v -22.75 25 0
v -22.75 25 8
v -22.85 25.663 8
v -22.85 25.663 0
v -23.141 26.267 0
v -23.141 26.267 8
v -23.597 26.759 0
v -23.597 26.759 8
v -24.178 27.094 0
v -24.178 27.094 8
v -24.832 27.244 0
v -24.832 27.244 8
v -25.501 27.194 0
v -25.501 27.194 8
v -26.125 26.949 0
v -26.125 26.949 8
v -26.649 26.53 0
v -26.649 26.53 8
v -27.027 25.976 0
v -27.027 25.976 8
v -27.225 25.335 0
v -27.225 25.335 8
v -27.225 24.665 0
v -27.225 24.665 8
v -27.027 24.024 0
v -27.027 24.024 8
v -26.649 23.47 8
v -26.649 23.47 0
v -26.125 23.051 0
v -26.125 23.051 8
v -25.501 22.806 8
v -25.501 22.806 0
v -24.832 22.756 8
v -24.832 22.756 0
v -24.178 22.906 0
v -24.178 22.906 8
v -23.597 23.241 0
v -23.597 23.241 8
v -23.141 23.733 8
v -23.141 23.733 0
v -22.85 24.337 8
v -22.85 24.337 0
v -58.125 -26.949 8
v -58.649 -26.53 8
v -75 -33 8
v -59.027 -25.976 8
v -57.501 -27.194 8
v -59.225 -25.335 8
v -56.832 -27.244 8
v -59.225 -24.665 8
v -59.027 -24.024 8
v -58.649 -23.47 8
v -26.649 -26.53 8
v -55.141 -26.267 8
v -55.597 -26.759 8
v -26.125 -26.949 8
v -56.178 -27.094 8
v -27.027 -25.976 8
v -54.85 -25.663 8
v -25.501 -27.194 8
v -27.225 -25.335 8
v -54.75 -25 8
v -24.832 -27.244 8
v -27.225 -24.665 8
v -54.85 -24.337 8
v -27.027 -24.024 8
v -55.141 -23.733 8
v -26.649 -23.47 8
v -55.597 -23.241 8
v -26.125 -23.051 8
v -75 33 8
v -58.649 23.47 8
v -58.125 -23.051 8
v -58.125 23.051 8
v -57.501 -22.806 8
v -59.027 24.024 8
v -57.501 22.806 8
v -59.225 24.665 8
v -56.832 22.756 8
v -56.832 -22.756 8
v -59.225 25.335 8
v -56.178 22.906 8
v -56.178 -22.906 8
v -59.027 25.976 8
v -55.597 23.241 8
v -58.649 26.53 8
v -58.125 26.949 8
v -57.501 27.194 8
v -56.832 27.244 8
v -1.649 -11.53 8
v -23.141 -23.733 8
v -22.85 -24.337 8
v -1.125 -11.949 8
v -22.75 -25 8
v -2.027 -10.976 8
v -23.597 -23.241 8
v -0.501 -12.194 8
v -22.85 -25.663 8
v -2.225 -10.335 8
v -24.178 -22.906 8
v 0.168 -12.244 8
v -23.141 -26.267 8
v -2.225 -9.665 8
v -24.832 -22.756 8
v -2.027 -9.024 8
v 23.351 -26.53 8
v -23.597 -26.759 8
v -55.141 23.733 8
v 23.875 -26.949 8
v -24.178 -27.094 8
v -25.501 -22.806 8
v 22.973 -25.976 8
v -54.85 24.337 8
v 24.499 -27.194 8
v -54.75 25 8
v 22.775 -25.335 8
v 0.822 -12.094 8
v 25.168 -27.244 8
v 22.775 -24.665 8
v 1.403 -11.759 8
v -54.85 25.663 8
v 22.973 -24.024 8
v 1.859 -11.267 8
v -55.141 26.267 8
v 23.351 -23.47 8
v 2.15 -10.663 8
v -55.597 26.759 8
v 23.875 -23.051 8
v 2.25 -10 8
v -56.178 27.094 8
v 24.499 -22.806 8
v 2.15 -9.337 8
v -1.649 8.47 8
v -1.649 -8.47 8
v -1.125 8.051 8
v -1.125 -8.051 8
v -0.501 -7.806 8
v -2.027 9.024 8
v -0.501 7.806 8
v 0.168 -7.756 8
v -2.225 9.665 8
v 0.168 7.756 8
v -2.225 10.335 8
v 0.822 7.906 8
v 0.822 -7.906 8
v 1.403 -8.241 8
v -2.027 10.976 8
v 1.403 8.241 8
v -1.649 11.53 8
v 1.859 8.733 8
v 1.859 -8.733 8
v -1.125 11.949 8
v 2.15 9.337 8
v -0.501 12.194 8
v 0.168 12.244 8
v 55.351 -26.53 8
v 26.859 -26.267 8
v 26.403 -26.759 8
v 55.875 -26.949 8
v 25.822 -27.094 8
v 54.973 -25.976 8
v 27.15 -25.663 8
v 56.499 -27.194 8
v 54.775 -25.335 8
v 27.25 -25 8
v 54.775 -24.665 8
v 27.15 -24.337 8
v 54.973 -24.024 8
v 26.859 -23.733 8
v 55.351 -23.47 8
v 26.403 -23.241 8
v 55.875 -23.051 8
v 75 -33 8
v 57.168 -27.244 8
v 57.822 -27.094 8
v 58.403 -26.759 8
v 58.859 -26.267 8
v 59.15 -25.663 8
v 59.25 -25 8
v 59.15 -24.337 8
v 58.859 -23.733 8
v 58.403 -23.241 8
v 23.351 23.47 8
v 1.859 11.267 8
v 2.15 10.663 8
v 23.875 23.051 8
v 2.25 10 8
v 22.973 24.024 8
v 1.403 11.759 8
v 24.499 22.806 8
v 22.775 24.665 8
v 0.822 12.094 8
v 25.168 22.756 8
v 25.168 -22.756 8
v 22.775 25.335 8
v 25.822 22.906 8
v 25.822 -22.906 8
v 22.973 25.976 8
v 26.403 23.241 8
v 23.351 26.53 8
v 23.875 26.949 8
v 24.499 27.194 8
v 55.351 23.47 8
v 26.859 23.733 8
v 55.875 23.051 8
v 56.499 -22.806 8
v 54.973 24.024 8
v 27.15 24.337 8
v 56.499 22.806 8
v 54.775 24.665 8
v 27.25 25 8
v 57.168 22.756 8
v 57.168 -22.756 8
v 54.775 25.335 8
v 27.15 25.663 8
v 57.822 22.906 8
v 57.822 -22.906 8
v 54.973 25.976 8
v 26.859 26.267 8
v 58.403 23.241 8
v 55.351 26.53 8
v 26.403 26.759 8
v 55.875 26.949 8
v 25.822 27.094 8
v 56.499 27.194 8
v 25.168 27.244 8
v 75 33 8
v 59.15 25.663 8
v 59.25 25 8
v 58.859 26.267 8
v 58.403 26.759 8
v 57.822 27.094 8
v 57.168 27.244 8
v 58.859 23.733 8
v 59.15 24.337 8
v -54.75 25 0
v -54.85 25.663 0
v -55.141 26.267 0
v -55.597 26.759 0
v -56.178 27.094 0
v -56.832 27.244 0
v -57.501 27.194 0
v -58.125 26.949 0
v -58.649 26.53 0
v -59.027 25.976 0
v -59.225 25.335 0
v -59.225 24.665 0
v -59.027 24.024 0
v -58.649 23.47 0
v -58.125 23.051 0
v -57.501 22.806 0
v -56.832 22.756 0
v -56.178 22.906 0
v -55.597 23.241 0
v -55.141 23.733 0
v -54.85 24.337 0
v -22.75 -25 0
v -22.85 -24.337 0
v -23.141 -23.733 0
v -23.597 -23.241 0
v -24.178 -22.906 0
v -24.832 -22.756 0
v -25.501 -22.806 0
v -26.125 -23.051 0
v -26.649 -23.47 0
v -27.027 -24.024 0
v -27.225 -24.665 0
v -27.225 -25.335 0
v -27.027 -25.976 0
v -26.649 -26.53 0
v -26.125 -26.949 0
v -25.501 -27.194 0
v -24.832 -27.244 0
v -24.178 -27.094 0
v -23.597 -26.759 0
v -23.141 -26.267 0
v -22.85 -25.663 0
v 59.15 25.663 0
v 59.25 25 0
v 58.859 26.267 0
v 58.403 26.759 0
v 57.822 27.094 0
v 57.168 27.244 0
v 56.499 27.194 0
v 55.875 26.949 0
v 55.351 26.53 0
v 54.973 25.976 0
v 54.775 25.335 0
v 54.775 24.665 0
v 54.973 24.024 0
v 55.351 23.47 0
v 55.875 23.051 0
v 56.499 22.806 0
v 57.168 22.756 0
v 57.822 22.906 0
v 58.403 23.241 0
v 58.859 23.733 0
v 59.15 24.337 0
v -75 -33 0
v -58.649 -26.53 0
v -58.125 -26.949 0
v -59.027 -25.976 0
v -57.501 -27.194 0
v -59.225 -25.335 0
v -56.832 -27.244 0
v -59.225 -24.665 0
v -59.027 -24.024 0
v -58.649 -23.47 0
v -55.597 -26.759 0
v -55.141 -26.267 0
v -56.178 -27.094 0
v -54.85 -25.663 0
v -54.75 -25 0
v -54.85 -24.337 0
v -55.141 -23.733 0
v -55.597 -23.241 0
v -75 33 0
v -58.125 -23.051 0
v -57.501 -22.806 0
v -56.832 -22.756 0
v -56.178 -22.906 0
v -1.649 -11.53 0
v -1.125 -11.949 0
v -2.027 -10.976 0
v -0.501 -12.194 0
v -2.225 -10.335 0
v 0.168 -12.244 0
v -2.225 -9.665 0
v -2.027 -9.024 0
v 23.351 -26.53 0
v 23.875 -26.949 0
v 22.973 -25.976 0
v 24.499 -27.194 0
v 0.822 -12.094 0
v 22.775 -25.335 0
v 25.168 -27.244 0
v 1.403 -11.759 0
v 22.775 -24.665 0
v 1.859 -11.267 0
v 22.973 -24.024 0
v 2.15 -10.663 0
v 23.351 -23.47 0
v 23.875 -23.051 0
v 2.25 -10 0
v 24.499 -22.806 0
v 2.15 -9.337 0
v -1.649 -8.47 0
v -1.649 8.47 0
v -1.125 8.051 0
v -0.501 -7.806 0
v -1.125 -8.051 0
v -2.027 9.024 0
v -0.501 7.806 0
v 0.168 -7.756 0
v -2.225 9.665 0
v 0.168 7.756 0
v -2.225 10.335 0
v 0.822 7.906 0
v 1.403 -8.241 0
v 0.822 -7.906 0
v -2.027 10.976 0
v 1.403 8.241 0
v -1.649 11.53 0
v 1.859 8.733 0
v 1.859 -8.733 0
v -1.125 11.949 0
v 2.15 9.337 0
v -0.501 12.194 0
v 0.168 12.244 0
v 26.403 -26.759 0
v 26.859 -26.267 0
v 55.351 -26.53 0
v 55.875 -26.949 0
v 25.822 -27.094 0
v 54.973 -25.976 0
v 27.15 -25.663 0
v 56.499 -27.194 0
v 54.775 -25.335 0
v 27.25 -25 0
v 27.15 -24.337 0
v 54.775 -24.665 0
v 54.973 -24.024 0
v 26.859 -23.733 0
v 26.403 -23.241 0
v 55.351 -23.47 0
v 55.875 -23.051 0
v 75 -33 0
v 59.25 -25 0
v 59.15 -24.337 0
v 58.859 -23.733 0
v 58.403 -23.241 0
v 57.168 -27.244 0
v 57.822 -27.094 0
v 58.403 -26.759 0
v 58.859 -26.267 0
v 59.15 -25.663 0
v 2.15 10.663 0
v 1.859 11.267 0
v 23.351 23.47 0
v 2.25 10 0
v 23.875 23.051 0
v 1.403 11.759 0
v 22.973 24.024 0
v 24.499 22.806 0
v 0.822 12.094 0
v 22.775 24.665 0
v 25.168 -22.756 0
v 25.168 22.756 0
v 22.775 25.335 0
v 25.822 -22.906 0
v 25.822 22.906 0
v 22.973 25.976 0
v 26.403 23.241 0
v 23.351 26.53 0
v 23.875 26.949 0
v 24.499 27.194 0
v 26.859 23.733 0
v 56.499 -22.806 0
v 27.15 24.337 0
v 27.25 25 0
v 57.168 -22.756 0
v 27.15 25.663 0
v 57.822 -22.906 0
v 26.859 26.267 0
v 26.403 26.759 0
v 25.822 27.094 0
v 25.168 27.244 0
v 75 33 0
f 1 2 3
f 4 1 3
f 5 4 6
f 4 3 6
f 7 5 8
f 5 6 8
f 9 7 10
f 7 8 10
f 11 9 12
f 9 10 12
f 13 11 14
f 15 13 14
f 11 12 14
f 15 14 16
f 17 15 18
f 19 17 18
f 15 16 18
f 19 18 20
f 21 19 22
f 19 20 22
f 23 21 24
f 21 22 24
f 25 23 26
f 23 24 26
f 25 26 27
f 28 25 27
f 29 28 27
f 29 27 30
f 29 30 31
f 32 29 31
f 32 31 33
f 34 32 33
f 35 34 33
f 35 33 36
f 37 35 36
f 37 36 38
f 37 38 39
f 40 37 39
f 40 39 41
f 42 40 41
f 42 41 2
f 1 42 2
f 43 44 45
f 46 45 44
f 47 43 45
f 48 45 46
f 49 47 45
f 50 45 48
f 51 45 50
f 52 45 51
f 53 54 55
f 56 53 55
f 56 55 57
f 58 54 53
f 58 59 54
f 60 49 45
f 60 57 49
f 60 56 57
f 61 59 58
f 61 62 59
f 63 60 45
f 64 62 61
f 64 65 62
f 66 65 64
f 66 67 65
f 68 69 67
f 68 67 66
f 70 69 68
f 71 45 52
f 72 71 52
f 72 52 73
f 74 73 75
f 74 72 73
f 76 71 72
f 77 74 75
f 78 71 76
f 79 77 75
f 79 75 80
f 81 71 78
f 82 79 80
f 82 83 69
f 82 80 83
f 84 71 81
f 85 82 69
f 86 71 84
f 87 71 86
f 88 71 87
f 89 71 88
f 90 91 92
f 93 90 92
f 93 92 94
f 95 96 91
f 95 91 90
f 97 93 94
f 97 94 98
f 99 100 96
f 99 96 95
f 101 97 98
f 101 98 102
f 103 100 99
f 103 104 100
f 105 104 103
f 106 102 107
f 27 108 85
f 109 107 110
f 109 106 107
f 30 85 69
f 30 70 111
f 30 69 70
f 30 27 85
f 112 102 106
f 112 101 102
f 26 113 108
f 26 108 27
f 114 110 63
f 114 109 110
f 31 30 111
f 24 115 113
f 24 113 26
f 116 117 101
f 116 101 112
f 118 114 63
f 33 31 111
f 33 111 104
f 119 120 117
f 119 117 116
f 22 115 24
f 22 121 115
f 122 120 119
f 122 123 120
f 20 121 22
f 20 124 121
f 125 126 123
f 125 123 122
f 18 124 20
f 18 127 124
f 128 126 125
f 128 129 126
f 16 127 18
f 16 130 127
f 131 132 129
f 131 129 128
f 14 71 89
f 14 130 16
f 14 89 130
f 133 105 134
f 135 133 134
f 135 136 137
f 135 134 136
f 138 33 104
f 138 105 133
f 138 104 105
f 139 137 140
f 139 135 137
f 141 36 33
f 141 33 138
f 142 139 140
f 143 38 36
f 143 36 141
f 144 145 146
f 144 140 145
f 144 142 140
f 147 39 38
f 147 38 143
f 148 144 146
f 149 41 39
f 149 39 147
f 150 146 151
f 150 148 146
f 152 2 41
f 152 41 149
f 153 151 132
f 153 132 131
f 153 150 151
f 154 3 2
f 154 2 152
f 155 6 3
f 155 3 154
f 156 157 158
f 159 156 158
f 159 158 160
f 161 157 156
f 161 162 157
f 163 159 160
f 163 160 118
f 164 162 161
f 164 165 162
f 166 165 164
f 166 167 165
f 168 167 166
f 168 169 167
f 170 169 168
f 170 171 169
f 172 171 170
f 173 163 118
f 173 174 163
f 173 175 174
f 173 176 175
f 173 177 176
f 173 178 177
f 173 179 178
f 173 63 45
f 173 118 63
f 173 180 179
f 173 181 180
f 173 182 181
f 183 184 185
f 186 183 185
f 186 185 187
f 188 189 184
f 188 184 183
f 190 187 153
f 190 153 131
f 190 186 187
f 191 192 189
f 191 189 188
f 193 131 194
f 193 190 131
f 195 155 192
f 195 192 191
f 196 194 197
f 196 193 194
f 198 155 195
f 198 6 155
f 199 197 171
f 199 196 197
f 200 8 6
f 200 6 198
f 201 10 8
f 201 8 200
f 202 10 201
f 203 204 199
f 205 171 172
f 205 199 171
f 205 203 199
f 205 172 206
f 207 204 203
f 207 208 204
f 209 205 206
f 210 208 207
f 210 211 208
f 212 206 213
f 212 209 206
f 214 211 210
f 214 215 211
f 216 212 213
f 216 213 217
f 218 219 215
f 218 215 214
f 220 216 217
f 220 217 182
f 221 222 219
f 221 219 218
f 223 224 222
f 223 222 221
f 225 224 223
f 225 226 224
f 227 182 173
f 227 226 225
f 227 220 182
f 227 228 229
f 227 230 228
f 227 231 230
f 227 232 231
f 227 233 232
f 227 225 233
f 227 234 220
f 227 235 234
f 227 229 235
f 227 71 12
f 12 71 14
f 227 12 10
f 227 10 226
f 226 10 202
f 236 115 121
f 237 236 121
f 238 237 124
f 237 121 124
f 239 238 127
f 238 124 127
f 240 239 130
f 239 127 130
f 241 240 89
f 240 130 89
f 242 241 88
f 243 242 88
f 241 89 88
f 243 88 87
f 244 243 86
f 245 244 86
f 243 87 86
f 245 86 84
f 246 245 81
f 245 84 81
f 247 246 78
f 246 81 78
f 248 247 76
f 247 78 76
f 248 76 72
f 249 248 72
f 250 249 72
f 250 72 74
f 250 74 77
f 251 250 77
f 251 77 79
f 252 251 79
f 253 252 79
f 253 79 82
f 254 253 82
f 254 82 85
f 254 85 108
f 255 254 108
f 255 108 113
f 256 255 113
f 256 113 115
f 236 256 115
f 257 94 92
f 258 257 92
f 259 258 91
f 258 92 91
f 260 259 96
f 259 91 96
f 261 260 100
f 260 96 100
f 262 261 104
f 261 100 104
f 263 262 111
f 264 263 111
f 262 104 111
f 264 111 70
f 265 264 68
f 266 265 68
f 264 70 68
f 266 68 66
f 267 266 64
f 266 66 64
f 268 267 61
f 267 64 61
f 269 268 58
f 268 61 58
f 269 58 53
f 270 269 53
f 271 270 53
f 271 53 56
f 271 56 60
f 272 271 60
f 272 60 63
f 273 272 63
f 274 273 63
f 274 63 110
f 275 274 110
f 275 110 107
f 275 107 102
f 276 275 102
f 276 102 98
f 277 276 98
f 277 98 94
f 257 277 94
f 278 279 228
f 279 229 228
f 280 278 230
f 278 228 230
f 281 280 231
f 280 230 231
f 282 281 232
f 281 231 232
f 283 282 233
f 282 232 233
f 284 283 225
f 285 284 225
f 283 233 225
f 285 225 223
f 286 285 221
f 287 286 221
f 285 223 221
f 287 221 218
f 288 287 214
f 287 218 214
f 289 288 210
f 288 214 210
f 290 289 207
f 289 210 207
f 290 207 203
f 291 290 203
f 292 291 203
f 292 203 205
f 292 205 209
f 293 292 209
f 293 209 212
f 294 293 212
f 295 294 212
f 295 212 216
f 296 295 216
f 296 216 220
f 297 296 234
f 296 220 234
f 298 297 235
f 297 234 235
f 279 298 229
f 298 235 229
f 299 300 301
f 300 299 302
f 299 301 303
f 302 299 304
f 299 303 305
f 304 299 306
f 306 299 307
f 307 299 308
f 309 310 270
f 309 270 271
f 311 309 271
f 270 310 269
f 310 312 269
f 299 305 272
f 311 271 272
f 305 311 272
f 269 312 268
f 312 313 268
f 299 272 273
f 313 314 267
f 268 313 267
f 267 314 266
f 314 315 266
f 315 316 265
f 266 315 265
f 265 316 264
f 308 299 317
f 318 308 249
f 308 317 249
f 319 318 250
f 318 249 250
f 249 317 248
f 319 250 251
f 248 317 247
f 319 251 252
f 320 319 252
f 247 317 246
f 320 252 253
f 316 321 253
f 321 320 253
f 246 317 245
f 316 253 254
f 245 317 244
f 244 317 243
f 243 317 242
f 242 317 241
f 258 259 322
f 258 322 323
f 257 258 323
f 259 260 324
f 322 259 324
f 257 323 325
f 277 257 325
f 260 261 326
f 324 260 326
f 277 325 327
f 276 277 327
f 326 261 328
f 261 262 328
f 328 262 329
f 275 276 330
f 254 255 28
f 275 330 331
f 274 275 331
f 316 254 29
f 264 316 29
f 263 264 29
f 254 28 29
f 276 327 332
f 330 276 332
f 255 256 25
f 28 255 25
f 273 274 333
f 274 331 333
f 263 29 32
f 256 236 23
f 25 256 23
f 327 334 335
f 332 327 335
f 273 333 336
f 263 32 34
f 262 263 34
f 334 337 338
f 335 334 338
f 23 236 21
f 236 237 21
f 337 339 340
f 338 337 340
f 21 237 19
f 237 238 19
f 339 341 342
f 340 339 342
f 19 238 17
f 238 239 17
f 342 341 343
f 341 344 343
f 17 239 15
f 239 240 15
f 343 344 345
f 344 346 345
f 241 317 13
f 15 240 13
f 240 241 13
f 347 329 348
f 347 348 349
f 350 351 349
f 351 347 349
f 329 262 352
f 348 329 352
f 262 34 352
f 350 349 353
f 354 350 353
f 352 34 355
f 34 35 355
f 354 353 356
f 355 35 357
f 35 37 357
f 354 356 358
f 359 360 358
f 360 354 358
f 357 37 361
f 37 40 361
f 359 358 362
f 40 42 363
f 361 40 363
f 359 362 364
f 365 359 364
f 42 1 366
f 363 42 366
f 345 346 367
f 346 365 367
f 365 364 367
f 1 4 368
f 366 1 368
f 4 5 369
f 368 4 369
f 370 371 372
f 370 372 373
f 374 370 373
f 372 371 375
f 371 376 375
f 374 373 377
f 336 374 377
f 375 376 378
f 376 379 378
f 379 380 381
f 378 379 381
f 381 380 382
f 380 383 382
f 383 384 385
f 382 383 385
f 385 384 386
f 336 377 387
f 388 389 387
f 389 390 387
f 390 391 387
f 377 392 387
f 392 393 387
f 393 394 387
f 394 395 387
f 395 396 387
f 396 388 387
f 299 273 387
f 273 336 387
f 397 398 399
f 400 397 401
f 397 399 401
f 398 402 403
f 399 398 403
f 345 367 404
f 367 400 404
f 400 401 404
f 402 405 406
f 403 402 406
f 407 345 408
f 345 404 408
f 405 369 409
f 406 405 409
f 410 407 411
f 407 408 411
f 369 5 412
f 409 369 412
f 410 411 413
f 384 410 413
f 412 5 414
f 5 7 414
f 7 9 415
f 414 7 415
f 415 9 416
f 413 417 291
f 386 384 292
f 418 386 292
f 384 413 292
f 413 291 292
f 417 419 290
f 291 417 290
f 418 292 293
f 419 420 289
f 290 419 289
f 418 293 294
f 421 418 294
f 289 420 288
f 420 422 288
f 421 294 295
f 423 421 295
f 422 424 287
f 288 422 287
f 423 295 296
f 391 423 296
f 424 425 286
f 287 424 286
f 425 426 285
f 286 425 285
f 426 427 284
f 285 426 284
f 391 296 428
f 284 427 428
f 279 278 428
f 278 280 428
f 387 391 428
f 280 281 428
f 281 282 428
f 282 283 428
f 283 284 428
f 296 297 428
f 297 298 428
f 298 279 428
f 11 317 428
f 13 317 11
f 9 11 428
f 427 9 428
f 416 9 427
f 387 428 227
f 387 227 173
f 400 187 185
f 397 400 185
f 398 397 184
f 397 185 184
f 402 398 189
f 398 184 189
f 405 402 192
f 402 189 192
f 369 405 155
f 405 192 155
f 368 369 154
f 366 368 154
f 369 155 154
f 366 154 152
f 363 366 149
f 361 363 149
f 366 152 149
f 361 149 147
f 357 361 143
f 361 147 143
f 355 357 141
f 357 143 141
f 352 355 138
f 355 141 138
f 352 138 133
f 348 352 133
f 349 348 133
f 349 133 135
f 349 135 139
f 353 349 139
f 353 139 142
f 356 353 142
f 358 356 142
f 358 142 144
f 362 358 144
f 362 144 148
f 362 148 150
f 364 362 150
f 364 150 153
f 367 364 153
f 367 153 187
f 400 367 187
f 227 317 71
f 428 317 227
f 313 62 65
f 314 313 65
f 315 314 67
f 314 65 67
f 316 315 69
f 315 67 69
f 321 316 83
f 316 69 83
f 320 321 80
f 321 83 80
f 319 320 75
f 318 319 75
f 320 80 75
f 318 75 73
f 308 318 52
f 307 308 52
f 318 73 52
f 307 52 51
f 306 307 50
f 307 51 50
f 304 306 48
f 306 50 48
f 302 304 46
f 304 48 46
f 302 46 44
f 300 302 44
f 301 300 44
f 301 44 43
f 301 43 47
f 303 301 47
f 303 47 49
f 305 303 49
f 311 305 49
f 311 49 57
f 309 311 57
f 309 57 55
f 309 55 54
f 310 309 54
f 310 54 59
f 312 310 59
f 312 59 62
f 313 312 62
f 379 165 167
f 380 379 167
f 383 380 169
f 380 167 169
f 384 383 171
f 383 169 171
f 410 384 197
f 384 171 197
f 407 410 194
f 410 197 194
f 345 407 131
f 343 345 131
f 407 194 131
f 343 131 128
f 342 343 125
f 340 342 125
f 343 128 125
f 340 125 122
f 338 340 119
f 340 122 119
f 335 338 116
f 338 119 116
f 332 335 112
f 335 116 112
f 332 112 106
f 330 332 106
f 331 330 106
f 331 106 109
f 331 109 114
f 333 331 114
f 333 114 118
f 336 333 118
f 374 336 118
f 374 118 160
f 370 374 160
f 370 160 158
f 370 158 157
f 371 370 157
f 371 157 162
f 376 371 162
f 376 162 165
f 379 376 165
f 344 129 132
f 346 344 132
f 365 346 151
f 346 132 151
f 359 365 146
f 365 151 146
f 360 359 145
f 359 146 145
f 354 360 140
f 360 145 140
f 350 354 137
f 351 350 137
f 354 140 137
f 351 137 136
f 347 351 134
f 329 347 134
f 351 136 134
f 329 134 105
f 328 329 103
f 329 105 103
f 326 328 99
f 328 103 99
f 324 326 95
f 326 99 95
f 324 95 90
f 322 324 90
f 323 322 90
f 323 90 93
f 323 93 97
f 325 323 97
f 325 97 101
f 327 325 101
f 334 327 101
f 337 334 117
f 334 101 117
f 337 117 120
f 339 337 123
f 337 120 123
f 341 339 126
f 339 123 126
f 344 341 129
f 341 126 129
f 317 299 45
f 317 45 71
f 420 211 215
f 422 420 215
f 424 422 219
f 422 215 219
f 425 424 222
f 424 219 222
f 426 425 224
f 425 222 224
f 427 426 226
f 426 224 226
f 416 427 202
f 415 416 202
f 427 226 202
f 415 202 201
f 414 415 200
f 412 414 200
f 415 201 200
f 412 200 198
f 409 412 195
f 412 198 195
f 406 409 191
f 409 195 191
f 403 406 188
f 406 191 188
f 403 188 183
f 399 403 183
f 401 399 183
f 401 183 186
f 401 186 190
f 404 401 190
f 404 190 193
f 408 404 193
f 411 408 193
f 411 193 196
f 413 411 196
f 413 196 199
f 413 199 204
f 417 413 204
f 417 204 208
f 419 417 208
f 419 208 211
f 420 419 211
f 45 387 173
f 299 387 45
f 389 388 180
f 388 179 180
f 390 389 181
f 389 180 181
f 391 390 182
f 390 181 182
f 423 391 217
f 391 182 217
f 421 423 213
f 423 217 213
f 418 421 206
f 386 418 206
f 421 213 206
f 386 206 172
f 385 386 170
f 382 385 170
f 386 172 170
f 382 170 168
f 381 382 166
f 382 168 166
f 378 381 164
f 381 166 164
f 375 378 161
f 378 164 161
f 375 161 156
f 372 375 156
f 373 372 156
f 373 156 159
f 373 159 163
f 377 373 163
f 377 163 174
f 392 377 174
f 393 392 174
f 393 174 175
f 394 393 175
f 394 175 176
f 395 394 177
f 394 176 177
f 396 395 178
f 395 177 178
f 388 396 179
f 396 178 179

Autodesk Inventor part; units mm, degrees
ref_plane "YZ Plane" through (0, 0, 0) normal (1, 0, 0) x (0, 1, 0)
ref_plane "XZ Plane" through (0, 0, 0) normal (0, 1, 0) x (-1, 0, 0)
ref_plane "XY Plane" through (0, 0, 0) normal (0, 0, 1) x (1, 0, 0)
sketch "Sketch1" plane through (0, 0, 0) normal (0, 0, 1) x (1, 0, 0)
  line L0 (-75, 33) -> (75, 33)
  line L1 (75, 33) -> (75, -33)
  line L2 (75, -33) -> (-75, -33)
  line L3 (-75, -33) -> (-75, 33)
  point P0 (0, 0)
  point P1 (0, 33)
  point P2 (-75, 0)
  dimension "d0" = 150
  dimension "d1" = 66
extrude "Extrusion1" add sketch "Sketch1" along normal blind 8
sketch "Sketch4" plane through (0, 0, 8) normal (0, 0, 1) x (1, 0, 0)
  circle A0 centre (-57, -25) radius 2.25
  circle A1 centre (-57, 25) radius 2.25
  line L0 (-75, 33) -> (-75, -33) projected
  line L1 (-75, -33) -> (75, -33) projected
  line L2 (75, 33) -> (-75, 33) projected
  circle A2 centre (-57, 0) radius 2.25
  circle A3 centre (-25, -25) radius 2.25
  circle A4 centre (-25, 0) radius 2.25
  circle A5 centre (-25, 25) radius 2.25
  circle A6 centre (57, -25) radius 2.25
  line L3 (75, -33) -> (75, 33) projected
  circle A7 centre (57, 0) radius 2.25
  circle A8 centre (57, 25) radius 2.25
  circle A9 centre (25, -25) radius 2.25
  circle A10 centre (25, 0) radius 2.25
  circle A11 centre (25, 25) radius 2.25
  circle A12 centre (0, -25) radius 2.25
  circle A13 centre (0, 25) radius 2.25
  circle A14 centre (0, 10) radius 2.25
  circle A15 centre (0, -10) radius 2.25
  point P0 (-75, 0)
  point P1 (-75, 0)
  point P2 (0, -33)
  dimension "d19" = 4.5
  dimension "d20" = 18
  dimension "d21" = 8
  dimension "d22" = 8
  dimension "d23" = 32
  dimension "d24" = 18
  dimension "d26" = 32
  dimension "d29" = 10
  dimension "d30" = 10
extrude "Extrusion4" cut sketch "Sketch4" against normal through all contours A0 | A1 | A3 | A5 | A6 | A8 | A9 | A11 | A14 | A15
equation "\"d22\" = d21"
equation "\"d24\" = d20"
equation "\"d26\" = d23"
properties part number "0005-10-012" material "Wood (Maple)"
